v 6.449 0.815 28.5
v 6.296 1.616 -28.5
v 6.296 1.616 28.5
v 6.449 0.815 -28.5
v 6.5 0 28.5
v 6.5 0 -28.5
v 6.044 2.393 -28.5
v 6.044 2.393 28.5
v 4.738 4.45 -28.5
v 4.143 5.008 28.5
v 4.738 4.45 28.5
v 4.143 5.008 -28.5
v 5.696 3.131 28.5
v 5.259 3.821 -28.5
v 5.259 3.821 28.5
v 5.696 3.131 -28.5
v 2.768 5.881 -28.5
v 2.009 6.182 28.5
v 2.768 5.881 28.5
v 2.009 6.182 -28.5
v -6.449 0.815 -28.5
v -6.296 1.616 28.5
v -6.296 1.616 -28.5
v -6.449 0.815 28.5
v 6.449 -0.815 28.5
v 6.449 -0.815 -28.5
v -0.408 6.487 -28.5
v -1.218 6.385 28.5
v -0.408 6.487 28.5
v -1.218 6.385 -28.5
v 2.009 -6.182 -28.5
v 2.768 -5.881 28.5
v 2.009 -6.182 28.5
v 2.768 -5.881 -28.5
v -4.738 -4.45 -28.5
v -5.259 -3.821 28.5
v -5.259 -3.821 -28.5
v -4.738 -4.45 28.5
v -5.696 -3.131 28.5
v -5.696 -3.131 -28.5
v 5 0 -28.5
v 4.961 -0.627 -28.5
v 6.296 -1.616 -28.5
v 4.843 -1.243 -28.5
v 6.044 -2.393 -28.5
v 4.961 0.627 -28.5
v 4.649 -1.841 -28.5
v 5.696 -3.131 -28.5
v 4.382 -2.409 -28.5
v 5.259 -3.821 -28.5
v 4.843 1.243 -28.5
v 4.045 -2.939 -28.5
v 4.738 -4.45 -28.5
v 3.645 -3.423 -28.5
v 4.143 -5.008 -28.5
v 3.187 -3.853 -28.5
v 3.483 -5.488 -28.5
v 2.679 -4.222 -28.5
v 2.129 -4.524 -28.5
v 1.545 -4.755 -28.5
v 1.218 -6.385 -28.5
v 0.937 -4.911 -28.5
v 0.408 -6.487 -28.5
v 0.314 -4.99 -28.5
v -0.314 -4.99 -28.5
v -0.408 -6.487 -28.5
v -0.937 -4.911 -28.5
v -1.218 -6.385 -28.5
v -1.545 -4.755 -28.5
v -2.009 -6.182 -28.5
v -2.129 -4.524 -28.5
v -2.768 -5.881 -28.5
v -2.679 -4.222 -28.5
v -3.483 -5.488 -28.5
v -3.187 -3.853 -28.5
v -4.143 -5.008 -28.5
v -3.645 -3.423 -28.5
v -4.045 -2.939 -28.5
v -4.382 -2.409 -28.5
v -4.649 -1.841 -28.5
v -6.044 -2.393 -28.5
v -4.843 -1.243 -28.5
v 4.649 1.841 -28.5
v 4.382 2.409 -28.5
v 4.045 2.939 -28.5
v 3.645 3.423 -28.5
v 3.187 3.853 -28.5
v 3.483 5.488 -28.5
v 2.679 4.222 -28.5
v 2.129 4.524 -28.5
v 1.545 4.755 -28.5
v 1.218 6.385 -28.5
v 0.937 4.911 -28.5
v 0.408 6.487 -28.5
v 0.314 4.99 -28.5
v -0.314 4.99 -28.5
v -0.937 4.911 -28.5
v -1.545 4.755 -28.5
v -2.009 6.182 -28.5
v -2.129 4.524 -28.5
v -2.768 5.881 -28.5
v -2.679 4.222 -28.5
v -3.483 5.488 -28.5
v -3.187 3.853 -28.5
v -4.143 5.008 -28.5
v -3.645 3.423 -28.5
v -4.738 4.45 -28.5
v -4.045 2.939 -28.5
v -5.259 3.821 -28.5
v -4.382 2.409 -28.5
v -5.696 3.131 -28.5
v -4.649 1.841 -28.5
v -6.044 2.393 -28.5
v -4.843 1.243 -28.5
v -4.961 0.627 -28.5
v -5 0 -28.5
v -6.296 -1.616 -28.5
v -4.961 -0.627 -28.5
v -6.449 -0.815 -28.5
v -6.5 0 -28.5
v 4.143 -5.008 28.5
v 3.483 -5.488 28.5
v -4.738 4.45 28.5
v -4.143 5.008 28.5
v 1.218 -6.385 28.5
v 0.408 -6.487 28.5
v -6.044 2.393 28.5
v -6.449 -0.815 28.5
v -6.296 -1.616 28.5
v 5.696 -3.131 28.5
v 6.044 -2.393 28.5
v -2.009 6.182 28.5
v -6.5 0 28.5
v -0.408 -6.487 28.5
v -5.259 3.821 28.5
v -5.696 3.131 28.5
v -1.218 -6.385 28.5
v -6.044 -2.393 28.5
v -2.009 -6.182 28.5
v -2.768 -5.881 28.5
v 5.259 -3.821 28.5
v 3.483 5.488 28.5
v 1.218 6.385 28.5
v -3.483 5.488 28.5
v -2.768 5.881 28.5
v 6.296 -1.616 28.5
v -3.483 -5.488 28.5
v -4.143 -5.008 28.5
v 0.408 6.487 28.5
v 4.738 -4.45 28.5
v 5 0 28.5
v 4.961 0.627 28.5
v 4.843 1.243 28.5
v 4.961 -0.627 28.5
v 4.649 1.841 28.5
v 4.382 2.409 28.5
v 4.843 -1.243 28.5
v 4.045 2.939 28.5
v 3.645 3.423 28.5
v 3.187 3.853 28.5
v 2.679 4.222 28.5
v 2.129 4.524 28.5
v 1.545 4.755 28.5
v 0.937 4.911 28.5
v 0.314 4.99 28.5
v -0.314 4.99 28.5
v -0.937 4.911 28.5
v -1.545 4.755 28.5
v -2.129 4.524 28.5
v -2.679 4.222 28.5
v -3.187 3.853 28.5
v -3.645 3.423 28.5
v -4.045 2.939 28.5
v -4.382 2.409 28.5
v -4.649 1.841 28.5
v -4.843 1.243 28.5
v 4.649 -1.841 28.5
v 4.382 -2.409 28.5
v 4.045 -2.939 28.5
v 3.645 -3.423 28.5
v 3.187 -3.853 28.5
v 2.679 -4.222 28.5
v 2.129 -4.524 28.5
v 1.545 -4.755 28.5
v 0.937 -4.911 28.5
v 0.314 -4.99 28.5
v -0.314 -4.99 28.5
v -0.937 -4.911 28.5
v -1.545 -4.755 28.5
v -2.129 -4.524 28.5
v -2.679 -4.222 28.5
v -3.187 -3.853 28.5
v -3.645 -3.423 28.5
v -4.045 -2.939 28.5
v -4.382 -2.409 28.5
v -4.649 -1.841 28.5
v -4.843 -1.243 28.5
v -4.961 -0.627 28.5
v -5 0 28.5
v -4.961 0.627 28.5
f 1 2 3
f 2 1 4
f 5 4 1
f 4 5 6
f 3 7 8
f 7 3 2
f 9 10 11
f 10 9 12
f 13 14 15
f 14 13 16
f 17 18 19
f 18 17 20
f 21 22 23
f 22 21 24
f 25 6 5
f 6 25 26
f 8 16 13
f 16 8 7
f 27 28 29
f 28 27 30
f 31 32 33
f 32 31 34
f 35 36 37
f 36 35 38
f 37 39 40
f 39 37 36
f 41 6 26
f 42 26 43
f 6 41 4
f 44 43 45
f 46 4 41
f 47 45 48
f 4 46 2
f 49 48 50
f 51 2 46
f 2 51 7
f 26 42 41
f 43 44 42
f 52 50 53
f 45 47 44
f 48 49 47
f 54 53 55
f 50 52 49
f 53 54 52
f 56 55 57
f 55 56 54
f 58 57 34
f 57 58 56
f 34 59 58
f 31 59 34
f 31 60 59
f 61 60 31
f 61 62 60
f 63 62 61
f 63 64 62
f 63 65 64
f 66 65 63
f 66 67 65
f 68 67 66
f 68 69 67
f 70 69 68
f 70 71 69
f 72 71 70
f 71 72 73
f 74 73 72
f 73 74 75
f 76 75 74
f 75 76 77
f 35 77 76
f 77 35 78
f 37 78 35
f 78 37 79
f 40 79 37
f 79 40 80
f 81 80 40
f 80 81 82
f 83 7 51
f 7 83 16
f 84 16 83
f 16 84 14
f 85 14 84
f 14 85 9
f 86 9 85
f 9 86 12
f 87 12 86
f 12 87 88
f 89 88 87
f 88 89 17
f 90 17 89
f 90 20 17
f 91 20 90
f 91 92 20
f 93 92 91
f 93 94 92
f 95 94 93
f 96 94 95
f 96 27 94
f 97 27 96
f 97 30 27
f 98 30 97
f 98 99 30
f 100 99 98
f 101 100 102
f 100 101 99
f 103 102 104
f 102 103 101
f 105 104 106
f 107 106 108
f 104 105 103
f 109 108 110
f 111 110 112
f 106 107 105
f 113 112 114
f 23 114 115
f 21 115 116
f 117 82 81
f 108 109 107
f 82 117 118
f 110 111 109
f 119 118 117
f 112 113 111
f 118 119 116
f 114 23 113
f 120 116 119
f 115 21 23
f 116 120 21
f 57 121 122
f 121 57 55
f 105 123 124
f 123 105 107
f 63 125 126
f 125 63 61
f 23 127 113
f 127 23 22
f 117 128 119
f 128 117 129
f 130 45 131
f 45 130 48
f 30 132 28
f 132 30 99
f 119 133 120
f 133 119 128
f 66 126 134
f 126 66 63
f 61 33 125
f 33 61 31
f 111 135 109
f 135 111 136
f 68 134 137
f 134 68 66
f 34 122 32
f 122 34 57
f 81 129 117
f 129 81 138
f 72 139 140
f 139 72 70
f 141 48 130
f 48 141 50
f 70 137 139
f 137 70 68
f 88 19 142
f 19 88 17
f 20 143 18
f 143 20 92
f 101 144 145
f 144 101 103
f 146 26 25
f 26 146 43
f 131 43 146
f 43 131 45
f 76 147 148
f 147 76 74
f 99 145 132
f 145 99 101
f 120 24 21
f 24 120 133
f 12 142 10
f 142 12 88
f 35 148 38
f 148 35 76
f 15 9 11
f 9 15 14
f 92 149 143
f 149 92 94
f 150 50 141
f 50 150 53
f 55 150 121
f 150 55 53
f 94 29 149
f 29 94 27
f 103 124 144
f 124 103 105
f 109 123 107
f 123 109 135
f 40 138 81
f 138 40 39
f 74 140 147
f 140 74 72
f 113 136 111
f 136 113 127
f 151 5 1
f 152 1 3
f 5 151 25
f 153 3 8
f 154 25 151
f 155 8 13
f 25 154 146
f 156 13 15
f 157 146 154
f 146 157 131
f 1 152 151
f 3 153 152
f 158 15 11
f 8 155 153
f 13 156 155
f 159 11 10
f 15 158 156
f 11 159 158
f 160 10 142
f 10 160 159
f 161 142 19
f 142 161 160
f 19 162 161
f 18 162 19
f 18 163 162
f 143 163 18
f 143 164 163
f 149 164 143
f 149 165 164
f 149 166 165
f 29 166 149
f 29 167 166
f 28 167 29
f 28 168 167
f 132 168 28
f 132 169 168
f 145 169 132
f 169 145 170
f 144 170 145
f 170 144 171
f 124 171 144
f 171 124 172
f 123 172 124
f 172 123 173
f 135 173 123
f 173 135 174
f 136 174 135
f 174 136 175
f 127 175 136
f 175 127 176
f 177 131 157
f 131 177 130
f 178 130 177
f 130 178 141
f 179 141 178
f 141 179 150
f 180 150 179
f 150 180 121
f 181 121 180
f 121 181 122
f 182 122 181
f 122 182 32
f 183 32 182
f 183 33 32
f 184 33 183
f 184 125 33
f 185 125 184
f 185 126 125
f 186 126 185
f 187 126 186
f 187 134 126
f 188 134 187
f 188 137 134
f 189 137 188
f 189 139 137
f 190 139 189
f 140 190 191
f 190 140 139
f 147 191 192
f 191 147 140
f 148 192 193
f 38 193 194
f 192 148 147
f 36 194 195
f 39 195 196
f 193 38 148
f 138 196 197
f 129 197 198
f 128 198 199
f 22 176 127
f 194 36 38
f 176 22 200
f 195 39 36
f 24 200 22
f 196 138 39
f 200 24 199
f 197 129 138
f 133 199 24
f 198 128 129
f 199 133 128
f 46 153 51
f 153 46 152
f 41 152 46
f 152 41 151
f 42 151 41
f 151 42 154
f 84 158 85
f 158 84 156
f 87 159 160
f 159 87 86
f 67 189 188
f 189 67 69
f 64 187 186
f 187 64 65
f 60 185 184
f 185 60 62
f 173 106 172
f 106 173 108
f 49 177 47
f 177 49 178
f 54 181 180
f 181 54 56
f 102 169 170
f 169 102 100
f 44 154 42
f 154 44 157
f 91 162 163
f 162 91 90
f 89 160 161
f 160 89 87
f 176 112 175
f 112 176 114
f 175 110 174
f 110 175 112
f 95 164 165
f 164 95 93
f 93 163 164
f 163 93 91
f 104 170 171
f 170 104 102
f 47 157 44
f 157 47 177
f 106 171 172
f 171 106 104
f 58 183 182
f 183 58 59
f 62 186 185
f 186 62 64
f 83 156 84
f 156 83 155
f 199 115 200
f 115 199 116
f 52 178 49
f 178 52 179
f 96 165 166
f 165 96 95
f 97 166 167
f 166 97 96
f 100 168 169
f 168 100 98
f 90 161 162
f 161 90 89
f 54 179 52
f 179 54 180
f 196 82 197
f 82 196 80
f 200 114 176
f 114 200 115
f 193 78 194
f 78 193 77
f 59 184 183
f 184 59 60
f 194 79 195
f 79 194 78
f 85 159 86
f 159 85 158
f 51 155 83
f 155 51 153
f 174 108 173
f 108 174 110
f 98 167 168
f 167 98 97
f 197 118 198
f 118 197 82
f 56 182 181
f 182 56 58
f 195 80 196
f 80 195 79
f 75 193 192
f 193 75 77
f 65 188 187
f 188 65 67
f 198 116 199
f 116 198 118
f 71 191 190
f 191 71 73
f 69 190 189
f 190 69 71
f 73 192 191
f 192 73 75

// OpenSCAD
$fn = 50;


difference() {
	union() {
		translate(v = [0, 0, -28.5000000000]) {
			cylinder(h = 57, r = 6.5000000000);
		}
	}
	union() {
		translate(v = [0, 0, -100.0000000000]) {
			cylinder(h = 200, r = 5.0000000000);
		}
	}
}
